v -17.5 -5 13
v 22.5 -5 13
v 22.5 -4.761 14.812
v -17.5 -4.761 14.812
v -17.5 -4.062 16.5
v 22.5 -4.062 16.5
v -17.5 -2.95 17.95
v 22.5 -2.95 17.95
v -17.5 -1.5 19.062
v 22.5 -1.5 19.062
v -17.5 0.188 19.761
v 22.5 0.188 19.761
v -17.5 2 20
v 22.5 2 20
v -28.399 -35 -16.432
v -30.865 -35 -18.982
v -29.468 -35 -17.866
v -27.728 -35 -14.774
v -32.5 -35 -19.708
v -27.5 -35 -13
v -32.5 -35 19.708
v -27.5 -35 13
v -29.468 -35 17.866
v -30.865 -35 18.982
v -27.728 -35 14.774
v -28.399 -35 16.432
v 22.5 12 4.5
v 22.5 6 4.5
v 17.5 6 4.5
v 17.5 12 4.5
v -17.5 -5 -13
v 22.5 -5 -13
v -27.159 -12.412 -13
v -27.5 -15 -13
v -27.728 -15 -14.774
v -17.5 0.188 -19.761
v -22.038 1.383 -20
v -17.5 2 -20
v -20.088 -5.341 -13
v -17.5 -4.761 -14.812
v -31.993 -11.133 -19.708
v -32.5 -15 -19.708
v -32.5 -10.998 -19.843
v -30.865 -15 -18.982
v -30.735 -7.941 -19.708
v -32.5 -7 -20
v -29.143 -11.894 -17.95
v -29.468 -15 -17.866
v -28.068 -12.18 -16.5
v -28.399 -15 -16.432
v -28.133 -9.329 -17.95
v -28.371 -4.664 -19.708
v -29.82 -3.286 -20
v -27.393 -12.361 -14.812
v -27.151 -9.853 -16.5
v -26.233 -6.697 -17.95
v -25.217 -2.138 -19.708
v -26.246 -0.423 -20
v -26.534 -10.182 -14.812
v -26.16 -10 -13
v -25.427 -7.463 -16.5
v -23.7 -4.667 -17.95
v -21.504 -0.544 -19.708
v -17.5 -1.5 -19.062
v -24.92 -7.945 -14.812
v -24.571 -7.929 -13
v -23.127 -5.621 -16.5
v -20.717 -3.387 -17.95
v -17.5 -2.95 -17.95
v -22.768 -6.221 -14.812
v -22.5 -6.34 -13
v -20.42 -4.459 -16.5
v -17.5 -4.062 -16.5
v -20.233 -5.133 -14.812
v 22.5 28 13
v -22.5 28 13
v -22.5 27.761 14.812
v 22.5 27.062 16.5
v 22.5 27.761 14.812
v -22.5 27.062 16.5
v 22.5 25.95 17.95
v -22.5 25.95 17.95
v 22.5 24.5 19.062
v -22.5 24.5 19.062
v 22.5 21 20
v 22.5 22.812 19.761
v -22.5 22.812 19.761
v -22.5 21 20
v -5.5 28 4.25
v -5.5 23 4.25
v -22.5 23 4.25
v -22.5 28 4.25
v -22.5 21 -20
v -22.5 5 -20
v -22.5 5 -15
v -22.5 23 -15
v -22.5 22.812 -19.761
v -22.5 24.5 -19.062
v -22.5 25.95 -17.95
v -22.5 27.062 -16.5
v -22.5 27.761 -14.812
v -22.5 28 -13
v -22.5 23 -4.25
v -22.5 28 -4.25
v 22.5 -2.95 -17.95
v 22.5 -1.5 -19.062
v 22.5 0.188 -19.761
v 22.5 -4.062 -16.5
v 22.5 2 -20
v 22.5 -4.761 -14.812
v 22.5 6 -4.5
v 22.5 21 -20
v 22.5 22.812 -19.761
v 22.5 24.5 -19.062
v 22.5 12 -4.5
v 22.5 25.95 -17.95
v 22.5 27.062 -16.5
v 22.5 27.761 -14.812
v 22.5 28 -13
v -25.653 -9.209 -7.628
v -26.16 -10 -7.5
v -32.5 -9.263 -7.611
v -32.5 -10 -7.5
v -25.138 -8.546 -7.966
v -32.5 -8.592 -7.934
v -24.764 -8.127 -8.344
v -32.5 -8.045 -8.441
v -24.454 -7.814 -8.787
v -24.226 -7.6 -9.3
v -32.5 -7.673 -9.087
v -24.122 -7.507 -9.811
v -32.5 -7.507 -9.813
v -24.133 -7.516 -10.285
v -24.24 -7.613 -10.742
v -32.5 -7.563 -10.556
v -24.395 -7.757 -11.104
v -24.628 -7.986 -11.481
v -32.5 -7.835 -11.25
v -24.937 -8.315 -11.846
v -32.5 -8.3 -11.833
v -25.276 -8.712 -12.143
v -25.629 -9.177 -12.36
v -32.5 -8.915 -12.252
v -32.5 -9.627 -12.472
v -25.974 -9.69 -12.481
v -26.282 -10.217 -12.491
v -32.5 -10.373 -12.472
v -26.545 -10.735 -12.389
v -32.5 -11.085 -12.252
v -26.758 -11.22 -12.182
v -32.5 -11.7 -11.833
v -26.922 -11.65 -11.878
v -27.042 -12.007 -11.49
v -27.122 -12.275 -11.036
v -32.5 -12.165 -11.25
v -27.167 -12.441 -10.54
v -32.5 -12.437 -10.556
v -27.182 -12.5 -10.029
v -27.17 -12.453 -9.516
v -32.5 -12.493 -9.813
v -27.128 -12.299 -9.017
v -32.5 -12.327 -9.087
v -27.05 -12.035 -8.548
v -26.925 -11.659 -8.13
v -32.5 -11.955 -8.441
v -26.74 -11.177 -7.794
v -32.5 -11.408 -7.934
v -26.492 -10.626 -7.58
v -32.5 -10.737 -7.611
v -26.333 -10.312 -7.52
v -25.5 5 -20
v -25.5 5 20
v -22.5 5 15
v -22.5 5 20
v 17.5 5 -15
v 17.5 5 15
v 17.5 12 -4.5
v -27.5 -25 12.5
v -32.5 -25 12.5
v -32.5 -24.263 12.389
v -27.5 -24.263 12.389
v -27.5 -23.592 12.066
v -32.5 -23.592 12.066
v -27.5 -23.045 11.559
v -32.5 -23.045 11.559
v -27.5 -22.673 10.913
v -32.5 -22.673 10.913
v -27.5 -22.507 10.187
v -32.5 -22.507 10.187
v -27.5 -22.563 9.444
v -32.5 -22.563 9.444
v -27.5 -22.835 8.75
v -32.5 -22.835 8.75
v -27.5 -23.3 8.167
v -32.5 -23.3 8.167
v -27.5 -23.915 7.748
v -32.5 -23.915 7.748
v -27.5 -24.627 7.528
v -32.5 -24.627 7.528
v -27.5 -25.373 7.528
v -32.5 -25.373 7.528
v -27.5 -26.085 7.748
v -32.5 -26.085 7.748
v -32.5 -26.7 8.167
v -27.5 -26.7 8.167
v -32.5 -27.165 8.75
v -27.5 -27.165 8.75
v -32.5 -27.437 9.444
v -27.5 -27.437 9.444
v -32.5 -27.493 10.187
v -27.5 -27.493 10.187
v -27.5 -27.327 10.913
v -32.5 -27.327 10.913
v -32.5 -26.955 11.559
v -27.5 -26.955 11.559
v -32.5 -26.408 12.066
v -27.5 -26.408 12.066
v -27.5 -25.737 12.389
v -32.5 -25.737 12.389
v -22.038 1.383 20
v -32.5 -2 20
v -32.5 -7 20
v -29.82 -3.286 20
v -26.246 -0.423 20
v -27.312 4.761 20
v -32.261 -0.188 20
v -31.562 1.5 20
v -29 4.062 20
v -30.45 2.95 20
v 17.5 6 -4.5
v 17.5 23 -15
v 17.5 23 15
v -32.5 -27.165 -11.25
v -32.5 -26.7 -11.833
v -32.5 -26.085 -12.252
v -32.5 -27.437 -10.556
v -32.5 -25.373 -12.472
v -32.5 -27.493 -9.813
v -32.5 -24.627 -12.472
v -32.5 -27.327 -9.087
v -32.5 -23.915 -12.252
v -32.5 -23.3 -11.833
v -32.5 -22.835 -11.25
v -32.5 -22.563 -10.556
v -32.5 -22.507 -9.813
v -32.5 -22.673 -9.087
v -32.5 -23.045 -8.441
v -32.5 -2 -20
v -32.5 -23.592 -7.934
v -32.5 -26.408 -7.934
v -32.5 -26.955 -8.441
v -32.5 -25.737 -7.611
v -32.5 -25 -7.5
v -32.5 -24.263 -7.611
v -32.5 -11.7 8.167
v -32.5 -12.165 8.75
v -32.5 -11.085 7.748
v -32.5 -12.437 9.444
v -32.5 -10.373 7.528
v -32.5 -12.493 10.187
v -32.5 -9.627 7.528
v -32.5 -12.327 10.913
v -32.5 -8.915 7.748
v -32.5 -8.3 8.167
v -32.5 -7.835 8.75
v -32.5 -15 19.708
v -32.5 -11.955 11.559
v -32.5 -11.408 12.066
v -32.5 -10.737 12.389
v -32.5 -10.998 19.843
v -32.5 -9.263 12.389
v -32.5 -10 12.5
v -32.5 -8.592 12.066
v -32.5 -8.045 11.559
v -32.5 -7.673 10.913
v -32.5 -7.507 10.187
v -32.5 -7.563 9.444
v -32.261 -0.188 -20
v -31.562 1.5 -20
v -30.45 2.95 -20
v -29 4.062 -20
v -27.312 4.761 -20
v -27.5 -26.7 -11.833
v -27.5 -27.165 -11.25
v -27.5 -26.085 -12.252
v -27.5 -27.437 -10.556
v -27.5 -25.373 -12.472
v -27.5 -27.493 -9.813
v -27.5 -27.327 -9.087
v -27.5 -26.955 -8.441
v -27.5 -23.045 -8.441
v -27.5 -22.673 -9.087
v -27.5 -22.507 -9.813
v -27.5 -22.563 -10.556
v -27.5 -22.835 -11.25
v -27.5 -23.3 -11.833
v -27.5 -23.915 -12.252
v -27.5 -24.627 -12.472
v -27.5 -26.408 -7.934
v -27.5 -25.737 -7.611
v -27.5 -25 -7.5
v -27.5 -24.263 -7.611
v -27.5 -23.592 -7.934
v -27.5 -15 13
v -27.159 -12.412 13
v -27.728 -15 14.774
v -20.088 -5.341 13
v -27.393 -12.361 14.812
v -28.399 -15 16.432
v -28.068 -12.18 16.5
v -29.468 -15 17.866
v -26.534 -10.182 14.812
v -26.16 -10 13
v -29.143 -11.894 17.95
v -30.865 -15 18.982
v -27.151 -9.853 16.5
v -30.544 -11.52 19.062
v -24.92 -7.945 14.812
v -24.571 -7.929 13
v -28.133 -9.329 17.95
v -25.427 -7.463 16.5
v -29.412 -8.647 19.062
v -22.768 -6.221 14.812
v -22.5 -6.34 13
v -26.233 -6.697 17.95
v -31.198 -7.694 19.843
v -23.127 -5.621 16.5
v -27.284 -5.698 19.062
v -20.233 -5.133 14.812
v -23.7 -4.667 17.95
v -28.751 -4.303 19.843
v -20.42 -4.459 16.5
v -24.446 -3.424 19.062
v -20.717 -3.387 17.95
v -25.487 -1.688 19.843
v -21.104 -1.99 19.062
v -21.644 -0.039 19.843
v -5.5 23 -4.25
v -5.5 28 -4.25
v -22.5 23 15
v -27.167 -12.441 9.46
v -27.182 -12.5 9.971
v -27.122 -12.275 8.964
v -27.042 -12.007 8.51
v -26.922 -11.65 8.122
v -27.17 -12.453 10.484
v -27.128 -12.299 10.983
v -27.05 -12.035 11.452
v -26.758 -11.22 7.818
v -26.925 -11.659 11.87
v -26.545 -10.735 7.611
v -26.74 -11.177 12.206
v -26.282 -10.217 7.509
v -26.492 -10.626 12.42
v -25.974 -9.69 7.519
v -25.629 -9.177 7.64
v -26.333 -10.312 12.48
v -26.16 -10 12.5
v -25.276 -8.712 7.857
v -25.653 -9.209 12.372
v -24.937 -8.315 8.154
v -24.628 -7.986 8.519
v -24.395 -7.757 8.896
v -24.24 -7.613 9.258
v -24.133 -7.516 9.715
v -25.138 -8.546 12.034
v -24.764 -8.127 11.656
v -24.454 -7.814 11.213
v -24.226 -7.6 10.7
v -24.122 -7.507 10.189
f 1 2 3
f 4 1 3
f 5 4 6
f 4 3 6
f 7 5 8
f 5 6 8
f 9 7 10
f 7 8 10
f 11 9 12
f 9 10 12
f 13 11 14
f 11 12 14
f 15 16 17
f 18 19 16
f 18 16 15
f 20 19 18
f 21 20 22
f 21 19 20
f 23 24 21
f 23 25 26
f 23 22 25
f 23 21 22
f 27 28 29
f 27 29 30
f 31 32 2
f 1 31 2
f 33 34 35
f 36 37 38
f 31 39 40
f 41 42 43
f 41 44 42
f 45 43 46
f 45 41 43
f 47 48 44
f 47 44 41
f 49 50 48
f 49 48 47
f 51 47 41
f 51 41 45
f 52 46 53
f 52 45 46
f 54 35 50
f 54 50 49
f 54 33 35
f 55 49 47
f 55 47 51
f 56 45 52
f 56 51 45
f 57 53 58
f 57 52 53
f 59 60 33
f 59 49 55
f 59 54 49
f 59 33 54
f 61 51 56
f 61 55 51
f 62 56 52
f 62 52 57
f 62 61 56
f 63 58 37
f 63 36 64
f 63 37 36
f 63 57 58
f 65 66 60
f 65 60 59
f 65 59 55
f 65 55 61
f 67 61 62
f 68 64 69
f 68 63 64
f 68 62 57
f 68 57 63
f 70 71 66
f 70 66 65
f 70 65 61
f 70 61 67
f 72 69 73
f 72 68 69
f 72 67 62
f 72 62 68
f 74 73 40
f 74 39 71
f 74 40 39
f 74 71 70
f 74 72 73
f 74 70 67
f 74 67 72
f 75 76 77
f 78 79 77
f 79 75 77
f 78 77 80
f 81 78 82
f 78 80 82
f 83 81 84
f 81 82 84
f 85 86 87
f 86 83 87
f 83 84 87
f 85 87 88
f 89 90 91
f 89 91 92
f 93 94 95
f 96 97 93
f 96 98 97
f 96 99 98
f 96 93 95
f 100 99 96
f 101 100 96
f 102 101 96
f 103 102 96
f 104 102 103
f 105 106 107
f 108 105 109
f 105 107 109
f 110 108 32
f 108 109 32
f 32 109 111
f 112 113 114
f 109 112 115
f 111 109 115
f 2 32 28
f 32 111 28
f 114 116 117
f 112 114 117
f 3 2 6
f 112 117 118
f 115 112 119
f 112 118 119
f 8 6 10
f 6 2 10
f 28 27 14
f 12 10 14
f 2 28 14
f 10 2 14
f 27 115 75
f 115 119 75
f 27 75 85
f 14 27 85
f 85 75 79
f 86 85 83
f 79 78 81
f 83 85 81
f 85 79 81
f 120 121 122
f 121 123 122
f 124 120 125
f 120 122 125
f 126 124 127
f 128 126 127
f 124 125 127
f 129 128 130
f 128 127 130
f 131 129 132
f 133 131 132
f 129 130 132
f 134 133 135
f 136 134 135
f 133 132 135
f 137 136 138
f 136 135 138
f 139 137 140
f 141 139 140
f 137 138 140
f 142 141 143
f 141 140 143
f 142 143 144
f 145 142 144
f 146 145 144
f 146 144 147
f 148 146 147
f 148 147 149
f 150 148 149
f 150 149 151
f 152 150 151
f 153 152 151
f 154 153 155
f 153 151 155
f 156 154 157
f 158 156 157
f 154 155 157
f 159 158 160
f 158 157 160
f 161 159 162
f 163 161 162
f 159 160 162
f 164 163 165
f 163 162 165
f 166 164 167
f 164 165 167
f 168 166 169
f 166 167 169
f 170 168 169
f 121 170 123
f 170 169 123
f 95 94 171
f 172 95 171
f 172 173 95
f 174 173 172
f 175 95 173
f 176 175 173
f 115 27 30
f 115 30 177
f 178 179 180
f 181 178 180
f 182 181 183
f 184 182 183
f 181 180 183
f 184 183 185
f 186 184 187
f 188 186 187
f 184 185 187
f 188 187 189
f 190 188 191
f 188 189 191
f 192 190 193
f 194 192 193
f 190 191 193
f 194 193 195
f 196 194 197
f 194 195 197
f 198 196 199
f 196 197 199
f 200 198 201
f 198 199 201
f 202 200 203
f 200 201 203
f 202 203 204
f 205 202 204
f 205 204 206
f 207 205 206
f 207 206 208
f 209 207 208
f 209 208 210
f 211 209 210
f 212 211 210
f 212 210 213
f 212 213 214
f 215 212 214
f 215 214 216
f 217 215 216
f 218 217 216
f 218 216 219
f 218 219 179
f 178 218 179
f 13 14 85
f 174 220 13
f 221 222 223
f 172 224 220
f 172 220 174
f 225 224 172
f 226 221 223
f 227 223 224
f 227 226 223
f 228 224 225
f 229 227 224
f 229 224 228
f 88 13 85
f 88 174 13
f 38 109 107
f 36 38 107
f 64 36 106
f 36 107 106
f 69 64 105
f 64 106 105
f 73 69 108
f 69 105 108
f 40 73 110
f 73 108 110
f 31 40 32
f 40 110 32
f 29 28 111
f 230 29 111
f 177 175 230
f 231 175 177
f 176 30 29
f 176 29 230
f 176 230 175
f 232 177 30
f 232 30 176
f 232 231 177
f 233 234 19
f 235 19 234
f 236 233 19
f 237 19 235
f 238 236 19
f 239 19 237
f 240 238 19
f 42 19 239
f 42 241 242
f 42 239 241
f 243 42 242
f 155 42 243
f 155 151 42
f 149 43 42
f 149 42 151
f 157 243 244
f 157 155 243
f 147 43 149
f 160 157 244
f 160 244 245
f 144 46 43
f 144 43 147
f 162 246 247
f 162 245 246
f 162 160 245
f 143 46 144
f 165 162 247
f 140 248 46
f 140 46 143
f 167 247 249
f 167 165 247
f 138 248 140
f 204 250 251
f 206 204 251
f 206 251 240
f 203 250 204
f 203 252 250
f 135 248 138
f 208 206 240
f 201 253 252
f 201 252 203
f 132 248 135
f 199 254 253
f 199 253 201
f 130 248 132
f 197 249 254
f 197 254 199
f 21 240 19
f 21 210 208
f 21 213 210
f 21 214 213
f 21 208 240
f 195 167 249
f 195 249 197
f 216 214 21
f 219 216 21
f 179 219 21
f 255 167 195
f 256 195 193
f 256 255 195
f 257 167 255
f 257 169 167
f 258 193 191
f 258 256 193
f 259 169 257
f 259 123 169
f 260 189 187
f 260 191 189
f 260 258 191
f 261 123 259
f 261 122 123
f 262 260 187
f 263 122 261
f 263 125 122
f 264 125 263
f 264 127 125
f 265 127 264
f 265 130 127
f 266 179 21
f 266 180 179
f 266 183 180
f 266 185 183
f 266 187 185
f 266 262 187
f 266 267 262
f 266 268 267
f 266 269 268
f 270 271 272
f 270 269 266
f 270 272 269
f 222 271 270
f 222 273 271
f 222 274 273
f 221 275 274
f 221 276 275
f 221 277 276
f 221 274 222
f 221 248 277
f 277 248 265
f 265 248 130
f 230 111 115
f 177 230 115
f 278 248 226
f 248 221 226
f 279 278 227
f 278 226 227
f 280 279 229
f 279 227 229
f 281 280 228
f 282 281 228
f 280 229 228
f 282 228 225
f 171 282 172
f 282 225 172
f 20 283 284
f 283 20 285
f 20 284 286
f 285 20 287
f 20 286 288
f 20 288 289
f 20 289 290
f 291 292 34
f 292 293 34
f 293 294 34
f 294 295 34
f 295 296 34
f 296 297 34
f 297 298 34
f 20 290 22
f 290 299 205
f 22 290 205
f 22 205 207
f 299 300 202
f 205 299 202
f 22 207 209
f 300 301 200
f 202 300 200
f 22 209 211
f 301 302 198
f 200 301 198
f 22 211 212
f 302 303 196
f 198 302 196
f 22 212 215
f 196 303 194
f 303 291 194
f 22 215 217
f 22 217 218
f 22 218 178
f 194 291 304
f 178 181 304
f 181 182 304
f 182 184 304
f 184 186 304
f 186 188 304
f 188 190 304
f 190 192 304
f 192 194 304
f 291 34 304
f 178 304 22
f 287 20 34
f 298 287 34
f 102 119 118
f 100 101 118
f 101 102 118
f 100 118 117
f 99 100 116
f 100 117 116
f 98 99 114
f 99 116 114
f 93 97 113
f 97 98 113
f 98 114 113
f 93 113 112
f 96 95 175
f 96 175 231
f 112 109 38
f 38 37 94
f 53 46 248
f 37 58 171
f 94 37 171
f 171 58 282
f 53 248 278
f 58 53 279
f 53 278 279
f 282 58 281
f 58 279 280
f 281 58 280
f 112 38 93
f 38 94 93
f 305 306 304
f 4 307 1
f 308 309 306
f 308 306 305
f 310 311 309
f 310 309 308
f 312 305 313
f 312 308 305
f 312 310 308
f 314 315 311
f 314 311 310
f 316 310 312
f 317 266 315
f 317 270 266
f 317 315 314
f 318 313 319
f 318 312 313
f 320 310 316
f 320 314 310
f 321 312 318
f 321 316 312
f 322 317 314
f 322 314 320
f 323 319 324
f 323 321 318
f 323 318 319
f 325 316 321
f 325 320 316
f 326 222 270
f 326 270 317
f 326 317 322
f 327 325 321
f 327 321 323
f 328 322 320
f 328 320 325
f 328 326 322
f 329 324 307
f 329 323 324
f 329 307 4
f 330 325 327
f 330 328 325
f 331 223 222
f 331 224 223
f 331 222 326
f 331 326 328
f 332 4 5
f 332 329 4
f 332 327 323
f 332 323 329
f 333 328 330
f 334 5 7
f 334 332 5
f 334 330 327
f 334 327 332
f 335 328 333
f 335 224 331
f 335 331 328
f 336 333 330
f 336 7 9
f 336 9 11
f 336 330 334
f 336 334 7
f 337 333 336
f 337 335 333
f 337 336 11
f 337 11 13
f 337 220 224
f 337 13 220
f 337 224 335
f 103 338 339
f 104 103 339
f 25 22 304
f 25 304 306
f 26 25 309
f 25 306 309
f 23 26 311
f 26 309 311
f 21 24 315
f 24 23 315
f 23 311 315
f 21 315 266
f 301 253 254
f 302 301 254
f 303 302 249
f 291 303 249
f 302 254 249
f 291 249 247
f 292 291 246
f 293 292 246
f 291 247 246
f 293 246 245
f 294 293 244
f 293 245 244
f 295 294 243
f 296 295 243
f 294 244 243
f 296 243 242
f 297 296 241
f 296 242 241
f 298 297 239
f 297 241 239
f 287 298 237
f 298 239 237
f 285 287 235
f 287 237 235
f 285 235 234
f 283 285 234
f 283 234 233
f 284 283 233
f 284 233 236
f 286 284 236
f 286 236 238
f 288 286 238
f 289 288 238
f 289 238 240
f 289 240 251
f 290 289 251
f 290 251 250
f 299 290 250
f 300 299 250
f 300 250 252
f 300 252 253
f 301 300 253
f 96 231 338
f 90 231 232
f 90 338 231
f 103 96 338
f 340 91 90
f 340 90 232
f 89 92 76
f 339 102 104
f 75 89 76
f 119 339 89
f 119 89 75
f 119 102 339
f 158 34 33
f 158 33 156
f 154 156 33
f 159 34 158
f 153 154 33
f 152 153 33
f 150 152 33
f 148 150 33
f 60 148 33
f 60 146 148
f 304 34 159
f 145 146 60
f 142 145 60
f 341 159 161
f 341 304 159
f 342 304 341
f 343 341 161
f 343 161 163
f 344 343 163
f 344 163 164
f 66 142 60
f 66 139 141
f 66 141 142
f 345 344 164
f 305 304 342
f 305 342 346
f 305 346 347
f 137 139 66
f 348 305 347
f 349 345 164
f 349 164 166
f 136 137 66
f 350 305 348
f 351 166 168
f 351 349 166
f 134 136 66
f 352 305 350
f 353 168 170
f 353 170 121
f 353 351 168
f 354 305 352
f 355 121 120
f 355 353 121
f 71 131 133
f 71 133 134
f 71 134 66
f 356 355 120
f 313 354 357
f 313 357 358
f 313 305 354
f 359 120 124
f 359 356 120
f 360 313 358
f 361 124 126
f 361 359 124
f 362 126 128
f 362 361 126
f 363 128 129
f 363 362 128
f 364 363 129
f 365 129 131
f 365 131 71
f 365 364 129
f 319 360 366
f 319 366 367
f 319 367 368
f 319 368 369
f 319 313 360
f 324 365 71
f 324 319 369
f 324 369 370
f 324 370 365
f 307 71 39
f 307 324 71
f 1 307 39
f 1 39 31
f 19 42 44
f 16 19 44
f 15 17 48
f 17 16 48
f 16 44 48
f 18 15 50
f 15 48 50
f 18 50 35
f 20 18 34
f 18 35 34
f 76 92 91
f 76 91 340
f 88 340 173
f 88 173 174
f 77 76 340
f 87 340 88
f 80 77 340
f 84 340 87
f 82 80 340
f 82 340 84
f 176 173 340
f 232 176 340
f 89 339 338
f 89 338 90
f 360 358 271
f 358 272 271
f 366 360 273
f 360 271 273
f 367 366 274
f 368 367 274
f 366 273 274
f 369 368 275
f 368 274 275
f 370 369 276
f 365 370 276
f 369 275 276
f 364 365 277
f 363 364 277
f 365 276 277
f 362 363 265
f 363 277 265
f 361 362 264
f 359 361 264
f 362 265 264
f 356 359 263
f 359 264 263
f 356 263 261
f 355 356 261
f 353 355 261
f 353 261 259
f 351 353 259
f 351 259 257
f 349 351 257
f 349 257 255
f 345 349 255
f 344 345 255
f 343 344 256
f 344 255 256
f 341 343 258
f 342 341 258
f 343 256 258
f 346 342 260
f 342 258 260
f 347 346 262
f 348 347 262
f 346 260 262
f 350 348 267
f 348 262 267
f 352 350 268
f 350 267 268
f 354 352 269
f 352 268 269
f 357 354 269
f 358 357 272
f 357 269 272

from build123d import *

# Parameters (mm, degrees)
SKETCH1_W           = 45
SKETCH1_H           = 40
BOSS_EXTRUDE1_DEPTH = 28
SKETCH5_W           = 30
SKETCH5_H           = 18
CUT_EXTRUDE2_DEPTH  = 40
SKETCH6_W           = 8.5
SKETCH6_H           = 5
CUT_EXTRUDE3_DEPTH  = 17
SKETCH7_W           = 9
SKETCH7_H           = 6
CUT_EXTRUDE4_DEPTH  = 17
SKETCH8_W           = 45
SKETCH8_H           = 40
BOSS_EXTRUDE2_DEPTH = 5
SKETCH9_W           = 40
SKETCH9_H           = 10
BOSS_EXTRUDE3_DEPTH = 10
SKETCH10_W          = 5
SKETCH10_H          = 40
BOSS_EXTRUDE4_DEPTH = 30
SKETCH13_R          = 2.5
CUT_EXTRUDE5_DEPTH  = 27
FILLET1_R           = 10
FILLET3_R           = 7
FILLET4_R           = 7


with BuildPart() as part:
    # Sketch1 → Boss-Extrude1 (new body)
    with BuildSketch(Plane(origin=(0, 0, 0), x_dir=(1, 0, 0), z_dir=(0, 1, 0))):
        Rectangle(SKETCH1_W, SKETCH1_H)
    extrude(amount=BOSS_EXTRUDE1_DEPTH)

    # Sketch5 → Cut-Extrude2 (cut)
    with BuildSketch(Plane.ZY.offset(22.5)):
        with Locations((0, 14)):
            Rectangle(SKETCH5_W, SKETCH5_H)
    extrude(amount=-CUT_EXTRUDE2_DEPTH, mode=Mode.SUBTRACT)

    # Sketch6 → Cut-Extrude3 (cut)
    with BuildSketch(Plane.ZY.offset(22.5)):
        with Locations((0, 25.5)):
            Rectangle(SKETCH6_W, SKETCH6_H)
    extrude(amount=-CUT_EXTRUDE3_DEPTH, mode=Mode.SUBTRACT)

    # Sketch7 → Cut-Extrude4 (cut)
    with BuildSketch(Plane(origin=(22.5, 0, 0), x_dir=(0, 0, -1), z_dir=(1, 0, 0))):
        with Locations((0, 9)):
            Rectangle(SKETCH7_W, SKETCH7_H)
    extrude(amount=-CUT_EXTRUDE4_DEPTH, mode=Mode.SUBTRACT)

    # Sketch8 → Boss-Extrude2 (add)
    with BuildSketch(Plane.XZ):
        Rectangle(SKETCH8_W, SKETCH8_H)
    extrude(amount=BOSS_EXTRUDE2_DEPTH)

    # Sketch9 → Boss-Extrude3 (add)
    with BuildSketch(Plane.ZY.offset(22.5)):
        Rectangle(SKETCH9_W, SKETCH9_H)
    extrude(amount=BOSS_EXTRUDE3_DEPTH)

    # Sketch10 → Boss-Extrude4 (add)
    with BuildSketch(Plane.XZ.offset(5)):
        with Locations((-30, 0)):
            Rectangle(SKETCH10_W, SKETCH10_H)
    extrude(amount=BOSS_EXTRUDE4_DEPTH)

    # Sketch13 → Cut-Extrude5 (cut)
    with BuildSketch(Plane.ZY.offset(32.5)):
        with Locations((-10, -25)):
            Circle(SKETCH13_R)
        with Locations((-10, -10)):
            Circle(SKETCH13_R)
        with Locations((10, -10)):
            Circle(SKETCH13_R)
        with Locations((10, -25)):
            Circle(SKETCH13_R)
    extrude(amount=-CUT_EXTRUDE5_DEPTH, mode=Mode.SUBTRACT)

    # Fillet1
    # the kernel refuses this fillet: 10 mm, written as the material it adds along each edge
    with BuildSketch(Plane(origin=(-27.5, -5, 20), x_dir=(0, -1, 0), z_dir=(0, 0, -1))) as fillet1_piece_1_section:
        with BuildLine():
            CenterArc((FILLET1_R, -FILLET1_R), FILLET1_R, 90, 90)
            Line((0, -FILLET1_R), (0, 0))
            Line((0, 0), (FILLET1_R, 0))
        make_face()
    fillet1_piece_1 = extrude(amount=40, mode=Mode.PRIVATE)
    fillet1_piece_1 = fillet1_piece_1 - Plane(origin=(-25.136048253, -10, 10), x_dir=(0, 0, 1), z_dir=(-1, 0, 0)) * Cylinder(2.5, 121, mode=Mode.PRIVATE)
    fillet1_piece_1 = fillet1_piece_1 - Plane(origin=(-25.136048253, -10, -10), x_dir=(0, 0, 1), z_dir=(-1, 0, 0)) * Cylinder(2.5, 121, mode=Mode.PRIVATE)
    add(fillet1_piece_1)

    # Fillet3
    # the kernel refuses this fillet: 7 mm, written as the material it takes off along each edge
    with BuildSketch(Plane(origin=(-27.5, -15, -20), x_dir=(-1, 0, 0), z_dir=(0, -1, 0))) as fillet3_piece_1:
        with BuildLine():
            CenterArc((FILLET3_R, -FILLET3_R), FILLET3_R, 90, 90)
            Line((0, -FILLET3_R), (0, 0))
            Line((0, 0), (FILLET3_R, 0))
        make_face()
    extrude(amount=37.5, mode=Mode.SUBTRACT)
    with BuildSketch(Plane(origin=(-17.5, -15, -20), x_dir=(-1, 0, 0), z_dir=(0, -1, 0))) as fillet3_piece_2:
        with BuildLine():
            CenterArc((10 + FILLET3_R, -FILLET3_R), FILLET3_R, 90, 90)
            Line((10 + FILLET3_R, 0), (10, 0))
            Line((10, 0), (10, -FILLET3_R))
        make_face()
    revolve(axis=Axis((-17.5, -15, -20), (0, 0, -1)), revolution_arc=90, mode=Mode.SUBTRACT)
    with BuildSketch(Plane(origin=(-27.5, -15, 20), x_dir=(-1, 0, 0), z_dir=(0, -1, 0))) as fillet3_piece_3:
        with BuildLine():
            CenterArc((FILLET3_R, FILLET3_R), FILLET3_R, 180, 90)
            Line((0, FILLET3_R), (0, 0))
            Line((0, 0), (FILLET3_R, 0))
        make_face()
    extrude(amount=37.5, mode=Mode.SUBTRACT)
    with BuildSketch(Plane(origin=(-17.5, -15, 20), x_dir=(-1, 0, 0), z_dir=(0, -1, 0))) as fillet3_piece_4:
        with BuildLine():
            CenterArc((10 + FILLET3_R, FILLET3_R), FILLET3_R, 180, 90)
            Line((10 + FILLET3_R, 0), (10, 0))
            Line((10, 0), (10, FILLET3_R))
        make_face()
    revolve(axis=Axis((-17.5, -15, 20), (0, 0, -1)), revolution_arc=90, mode=Mode.SUBTRACT)
    with BuildSketch(Plane(origin=(40, -5, -20), x_dir=(0, 0, 1), z_dir=(-1, 0, 0))) as fillet3_piece_5:
        with BuildLine():
            CenterArc((FILLET3_R, FILLET3_R), FILLET3_R, 180, 90)
            Line((0, FILLET3_R), (0, 0))
            Line((0, 0), (FILLET3_R, 0))
        make_face()
    extrude(amount=57.5, mode=Mode.SUBTRACT)
    with BuildSketch(Plane(origin=(40, 28, -20), x_dir=(0, 0, 1), z_dir=(-1, 0, 0)), Plane(origin=(-40, 28, 20), x_dir=(0, 0, -1), z_dir=(1, 0, 0))) as fillet3_piece_6:
        with BuildLine():
            CenterArc((FILLET3_R, -FILLET3_R), FILLET3_R, 90, 90)
            Line((0, -FILLET3_R), (0, 0))
            Line((0, 0), (FILLET3_R, 0))
        make_face()
    extrude(amount=80, mode=Mode.SUBTRACT)
    with BuildSketch(Plane(origin=(40, -5, 20), x_dir=(0, 0, -1), z_dir=(-1, 0, 0))) as fillet3_piece_7:
        with BuildLine():
            CenterArc((FILLET3_R, -FILLET3_R), FILLET3_R, 90, 90)
            Line((0, -FILLET3_R), (0, 0))
            Line((0, 0), (FILLET3_R, 0))
        make_face()
    extrude(amount=57.5, mode=Mode.SUBTRACT)

    # Fillet4
    fillet4_edges = [part.edges().sort_by_distance(p)[0] for p in [
        (-32.5, 5, 0),
    ]]
    fillet(fillet4_edges, radius=FILLET4_R)


solid = part.part
